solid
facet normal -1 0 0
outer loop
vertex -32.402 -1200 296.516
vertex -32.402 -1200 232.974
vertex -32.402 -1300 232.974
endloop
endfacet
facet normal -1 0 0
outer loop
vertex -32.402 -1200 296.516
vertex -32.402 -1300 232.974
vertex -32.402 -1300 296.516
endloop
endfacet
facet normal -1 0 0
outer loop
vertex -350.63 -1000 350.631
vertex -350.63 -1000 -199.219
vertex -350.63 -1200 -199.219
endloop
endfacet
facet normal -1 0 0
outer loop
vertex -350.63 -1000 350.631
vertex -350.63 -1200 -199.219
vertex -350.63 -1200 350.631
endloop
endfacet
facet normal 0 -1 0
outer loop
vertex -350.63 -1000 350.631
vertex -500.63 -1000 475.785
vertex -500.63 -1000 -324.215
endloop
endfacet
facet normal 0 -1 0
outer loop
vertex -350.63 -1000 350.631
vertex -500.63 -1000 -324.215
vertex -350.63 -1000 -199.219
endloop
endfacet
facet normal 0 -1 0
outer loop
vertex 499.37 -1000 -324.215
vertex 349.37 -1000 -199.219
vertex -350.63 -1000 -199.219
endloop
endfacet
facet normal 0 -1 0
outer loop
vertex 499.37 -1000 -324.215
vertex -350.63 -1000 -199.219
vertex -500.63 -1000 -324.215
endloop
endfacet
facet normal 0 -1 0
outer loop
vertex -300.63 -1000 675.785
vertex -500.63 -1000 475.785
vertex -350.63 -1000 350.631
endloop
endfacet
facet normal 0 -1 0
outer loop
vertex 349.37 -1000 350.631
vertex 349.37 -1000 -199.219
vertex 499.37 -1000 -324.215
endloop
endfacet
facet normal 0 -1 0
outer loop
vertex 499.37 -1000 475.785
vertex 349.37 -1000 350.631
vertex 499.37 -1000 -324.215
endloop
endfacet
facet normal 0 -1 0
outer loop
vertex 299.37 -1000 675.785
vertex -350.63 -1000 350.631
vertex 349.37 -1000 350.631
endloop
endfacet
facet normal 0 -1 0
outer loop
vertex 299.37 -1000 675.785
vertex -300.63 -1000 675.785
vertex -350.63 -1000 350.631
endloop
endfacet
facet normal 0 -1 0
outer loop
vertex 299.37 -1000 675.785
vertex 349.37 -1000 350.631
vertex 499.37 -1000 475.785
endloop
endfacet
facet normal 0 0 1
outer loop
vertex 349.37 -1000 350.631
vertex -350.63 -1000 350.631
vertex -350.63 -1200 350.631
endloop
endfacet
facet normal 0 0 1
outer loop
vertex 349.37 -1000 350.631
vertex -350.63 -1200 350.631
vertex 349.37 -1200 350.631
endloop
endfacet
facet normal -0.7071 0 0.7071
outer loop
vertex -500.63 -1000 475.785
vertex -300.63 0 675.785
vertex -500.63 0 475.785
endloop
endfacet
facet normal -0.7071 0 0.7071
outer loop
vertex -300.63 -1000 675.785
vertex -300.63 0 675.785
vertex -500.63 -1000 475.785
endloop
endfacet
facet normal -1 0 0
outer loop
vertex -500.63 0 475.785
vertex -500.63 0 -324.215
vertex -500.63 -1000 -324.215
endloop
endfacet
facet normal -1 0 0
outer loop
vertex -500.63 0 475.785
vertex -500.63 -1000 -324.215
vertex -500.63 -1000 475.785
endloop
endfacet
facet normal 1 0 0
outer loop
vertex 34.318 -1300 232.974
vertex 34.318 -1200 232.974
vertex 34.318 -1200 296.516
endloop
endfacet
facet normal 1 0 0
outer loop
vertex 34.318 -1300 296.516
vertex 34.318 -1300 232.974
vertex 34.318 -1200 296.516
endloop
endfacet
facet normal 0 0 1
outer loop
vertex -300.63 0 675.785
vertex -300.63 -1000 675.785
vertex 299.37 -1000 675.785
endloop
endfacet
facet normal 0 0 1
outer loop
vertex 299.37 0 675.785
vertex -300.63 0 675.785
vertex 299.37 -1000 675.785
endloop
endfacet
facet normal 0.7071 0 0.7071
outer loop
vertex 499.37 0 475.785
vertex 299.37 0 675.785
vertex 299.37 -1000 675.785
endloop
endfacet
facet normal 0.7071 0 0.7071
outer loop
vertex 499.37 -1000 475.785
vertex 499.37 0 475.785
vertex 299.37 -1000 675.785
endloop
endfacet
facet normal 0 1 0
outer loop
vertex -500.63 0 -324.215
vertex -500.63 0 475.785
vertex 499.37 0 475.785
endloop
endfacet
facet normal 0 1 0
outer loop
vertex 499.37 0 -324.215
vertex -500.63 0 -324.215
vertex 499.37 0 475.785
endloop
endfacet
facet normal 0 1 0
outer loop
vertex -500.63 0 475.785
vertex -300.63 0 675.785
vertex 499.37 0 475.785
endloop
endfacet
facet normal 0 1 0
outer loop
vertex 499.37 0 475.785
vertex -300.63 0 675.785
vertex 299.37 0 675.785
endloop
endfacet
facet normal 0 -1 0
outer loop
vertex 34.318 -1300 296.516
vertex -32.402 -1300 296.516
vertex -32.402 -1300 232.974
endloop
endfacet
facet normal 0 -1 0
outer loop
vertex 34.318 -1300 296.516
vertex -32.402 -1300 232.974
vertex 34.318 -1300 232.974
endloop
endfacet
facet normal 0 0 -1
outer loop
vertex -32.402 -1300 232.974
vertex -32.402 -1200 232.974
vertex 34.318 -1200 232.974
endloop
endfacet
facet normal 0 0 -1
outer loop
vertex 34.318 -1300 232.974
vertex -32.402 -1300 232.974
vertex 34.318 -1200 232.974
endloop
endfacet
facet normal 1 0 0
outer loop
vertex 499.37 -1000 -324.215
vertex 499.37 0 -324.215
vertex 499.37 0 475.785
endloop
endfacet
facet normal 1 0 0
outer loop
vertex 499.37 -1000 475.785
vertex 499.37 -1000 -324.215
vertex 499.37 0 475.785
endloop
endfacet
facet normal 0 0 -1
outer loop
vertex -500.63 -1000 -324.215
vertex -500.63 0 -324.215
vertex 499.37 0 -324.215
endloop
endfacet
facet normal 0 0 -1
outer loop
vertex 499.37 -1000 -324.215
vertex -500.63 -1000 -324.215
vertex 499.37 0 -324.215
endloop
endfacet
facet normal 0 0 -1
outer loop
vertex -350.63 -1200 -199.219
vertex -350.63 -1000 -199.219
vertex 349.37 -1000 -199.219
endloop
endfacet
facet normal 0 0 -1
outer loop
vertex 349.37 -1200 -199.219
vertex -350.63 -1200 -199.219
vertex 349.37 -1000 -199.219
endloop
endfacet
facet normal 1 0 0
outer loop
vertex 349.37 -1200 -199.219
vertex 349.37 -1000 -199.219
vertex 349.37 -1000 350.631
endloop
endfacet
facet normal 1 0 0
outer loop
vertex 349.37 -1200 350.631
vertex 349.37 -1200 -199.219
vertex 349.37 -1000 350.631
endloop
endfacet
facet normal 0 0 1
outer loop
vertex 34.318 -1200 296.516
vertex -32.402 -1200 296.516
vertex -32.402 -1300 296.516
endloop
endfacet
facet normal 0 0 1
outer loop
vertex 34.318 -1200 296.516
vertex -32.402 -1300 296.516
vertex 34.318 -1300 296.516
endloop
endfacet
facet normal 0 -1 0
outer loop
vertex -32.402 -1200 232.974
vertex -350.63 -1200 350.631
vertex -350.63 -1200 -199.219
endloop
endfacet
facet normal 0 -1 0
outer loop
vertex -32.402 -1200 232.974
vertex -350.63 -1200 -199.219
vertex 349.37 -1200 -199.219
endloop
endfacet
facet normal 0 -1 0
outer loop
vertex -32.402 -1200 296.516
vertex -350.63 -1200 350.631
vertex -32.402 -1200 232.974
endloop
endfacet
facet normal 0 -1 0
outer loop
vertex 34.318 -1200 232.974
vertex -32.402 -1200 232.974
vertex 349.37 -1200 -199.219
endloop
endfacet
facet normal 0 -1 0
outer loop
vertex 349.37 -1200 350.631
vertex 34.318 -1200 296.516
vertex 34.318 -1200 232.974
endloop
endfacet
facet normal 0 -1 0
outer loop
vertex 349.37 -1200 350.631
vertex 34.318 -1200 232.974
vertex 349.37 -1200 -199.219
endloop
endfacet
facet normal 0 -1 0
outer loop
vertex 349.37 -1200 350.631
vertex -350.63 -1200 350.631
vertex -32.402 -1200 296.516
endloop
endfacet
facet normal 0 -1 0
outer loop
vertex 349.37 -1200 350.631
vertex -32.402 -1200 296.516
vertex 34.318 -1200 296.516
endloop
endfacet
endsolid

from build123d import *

# Parameters (mm, degrees)
F0_W     = 1000
F0_H     = 1000
F1_DEPTH = 1000
F2_SIZE  = 200
F3_W     = 700
F3_H     = 549.8493
F4_DEPTH = 200
F5_W     = 66.719718
F5_H     = 63.54259
F6_DEPTH = 100


with BuildPart() as f1:
    # F0 (on Front) → F1 (new body)
    with BuildSketch(Plane.XZ):
        with Locations((-0.63042, 175.785489)):
            Rectangle(F0_W, F0_H)
    extrude(amount=F1_DEPTH)

    # F2
    f2_edges = [f1.edges().sort_by_distance(p)[0] for p in [
        (-500.63042, -500, 675.785489),
        (499.36958, -500, 675.785489),
    ]]
    chamfer(f2_edges, length=F2_SIZE)

    # F3 (on face) → F4 (join)
    with BuildSketch(Plane.XZ.offset(1000)):
        with Locations((-0.63042, 75.705871)):
            Rectangle(F3_W, F3_H)
    extrude(amount=F4_DEPTH)

    # F5 (on face) → F6 (join)
    with BuildSketch(Plane.XZ.offset(1200)):
        with Locations((0.958163, 264.745094)):
            Rectangle(F5_W, F5_H)
    extrude(amount=F6_DEPTH)


solid = f1.part
